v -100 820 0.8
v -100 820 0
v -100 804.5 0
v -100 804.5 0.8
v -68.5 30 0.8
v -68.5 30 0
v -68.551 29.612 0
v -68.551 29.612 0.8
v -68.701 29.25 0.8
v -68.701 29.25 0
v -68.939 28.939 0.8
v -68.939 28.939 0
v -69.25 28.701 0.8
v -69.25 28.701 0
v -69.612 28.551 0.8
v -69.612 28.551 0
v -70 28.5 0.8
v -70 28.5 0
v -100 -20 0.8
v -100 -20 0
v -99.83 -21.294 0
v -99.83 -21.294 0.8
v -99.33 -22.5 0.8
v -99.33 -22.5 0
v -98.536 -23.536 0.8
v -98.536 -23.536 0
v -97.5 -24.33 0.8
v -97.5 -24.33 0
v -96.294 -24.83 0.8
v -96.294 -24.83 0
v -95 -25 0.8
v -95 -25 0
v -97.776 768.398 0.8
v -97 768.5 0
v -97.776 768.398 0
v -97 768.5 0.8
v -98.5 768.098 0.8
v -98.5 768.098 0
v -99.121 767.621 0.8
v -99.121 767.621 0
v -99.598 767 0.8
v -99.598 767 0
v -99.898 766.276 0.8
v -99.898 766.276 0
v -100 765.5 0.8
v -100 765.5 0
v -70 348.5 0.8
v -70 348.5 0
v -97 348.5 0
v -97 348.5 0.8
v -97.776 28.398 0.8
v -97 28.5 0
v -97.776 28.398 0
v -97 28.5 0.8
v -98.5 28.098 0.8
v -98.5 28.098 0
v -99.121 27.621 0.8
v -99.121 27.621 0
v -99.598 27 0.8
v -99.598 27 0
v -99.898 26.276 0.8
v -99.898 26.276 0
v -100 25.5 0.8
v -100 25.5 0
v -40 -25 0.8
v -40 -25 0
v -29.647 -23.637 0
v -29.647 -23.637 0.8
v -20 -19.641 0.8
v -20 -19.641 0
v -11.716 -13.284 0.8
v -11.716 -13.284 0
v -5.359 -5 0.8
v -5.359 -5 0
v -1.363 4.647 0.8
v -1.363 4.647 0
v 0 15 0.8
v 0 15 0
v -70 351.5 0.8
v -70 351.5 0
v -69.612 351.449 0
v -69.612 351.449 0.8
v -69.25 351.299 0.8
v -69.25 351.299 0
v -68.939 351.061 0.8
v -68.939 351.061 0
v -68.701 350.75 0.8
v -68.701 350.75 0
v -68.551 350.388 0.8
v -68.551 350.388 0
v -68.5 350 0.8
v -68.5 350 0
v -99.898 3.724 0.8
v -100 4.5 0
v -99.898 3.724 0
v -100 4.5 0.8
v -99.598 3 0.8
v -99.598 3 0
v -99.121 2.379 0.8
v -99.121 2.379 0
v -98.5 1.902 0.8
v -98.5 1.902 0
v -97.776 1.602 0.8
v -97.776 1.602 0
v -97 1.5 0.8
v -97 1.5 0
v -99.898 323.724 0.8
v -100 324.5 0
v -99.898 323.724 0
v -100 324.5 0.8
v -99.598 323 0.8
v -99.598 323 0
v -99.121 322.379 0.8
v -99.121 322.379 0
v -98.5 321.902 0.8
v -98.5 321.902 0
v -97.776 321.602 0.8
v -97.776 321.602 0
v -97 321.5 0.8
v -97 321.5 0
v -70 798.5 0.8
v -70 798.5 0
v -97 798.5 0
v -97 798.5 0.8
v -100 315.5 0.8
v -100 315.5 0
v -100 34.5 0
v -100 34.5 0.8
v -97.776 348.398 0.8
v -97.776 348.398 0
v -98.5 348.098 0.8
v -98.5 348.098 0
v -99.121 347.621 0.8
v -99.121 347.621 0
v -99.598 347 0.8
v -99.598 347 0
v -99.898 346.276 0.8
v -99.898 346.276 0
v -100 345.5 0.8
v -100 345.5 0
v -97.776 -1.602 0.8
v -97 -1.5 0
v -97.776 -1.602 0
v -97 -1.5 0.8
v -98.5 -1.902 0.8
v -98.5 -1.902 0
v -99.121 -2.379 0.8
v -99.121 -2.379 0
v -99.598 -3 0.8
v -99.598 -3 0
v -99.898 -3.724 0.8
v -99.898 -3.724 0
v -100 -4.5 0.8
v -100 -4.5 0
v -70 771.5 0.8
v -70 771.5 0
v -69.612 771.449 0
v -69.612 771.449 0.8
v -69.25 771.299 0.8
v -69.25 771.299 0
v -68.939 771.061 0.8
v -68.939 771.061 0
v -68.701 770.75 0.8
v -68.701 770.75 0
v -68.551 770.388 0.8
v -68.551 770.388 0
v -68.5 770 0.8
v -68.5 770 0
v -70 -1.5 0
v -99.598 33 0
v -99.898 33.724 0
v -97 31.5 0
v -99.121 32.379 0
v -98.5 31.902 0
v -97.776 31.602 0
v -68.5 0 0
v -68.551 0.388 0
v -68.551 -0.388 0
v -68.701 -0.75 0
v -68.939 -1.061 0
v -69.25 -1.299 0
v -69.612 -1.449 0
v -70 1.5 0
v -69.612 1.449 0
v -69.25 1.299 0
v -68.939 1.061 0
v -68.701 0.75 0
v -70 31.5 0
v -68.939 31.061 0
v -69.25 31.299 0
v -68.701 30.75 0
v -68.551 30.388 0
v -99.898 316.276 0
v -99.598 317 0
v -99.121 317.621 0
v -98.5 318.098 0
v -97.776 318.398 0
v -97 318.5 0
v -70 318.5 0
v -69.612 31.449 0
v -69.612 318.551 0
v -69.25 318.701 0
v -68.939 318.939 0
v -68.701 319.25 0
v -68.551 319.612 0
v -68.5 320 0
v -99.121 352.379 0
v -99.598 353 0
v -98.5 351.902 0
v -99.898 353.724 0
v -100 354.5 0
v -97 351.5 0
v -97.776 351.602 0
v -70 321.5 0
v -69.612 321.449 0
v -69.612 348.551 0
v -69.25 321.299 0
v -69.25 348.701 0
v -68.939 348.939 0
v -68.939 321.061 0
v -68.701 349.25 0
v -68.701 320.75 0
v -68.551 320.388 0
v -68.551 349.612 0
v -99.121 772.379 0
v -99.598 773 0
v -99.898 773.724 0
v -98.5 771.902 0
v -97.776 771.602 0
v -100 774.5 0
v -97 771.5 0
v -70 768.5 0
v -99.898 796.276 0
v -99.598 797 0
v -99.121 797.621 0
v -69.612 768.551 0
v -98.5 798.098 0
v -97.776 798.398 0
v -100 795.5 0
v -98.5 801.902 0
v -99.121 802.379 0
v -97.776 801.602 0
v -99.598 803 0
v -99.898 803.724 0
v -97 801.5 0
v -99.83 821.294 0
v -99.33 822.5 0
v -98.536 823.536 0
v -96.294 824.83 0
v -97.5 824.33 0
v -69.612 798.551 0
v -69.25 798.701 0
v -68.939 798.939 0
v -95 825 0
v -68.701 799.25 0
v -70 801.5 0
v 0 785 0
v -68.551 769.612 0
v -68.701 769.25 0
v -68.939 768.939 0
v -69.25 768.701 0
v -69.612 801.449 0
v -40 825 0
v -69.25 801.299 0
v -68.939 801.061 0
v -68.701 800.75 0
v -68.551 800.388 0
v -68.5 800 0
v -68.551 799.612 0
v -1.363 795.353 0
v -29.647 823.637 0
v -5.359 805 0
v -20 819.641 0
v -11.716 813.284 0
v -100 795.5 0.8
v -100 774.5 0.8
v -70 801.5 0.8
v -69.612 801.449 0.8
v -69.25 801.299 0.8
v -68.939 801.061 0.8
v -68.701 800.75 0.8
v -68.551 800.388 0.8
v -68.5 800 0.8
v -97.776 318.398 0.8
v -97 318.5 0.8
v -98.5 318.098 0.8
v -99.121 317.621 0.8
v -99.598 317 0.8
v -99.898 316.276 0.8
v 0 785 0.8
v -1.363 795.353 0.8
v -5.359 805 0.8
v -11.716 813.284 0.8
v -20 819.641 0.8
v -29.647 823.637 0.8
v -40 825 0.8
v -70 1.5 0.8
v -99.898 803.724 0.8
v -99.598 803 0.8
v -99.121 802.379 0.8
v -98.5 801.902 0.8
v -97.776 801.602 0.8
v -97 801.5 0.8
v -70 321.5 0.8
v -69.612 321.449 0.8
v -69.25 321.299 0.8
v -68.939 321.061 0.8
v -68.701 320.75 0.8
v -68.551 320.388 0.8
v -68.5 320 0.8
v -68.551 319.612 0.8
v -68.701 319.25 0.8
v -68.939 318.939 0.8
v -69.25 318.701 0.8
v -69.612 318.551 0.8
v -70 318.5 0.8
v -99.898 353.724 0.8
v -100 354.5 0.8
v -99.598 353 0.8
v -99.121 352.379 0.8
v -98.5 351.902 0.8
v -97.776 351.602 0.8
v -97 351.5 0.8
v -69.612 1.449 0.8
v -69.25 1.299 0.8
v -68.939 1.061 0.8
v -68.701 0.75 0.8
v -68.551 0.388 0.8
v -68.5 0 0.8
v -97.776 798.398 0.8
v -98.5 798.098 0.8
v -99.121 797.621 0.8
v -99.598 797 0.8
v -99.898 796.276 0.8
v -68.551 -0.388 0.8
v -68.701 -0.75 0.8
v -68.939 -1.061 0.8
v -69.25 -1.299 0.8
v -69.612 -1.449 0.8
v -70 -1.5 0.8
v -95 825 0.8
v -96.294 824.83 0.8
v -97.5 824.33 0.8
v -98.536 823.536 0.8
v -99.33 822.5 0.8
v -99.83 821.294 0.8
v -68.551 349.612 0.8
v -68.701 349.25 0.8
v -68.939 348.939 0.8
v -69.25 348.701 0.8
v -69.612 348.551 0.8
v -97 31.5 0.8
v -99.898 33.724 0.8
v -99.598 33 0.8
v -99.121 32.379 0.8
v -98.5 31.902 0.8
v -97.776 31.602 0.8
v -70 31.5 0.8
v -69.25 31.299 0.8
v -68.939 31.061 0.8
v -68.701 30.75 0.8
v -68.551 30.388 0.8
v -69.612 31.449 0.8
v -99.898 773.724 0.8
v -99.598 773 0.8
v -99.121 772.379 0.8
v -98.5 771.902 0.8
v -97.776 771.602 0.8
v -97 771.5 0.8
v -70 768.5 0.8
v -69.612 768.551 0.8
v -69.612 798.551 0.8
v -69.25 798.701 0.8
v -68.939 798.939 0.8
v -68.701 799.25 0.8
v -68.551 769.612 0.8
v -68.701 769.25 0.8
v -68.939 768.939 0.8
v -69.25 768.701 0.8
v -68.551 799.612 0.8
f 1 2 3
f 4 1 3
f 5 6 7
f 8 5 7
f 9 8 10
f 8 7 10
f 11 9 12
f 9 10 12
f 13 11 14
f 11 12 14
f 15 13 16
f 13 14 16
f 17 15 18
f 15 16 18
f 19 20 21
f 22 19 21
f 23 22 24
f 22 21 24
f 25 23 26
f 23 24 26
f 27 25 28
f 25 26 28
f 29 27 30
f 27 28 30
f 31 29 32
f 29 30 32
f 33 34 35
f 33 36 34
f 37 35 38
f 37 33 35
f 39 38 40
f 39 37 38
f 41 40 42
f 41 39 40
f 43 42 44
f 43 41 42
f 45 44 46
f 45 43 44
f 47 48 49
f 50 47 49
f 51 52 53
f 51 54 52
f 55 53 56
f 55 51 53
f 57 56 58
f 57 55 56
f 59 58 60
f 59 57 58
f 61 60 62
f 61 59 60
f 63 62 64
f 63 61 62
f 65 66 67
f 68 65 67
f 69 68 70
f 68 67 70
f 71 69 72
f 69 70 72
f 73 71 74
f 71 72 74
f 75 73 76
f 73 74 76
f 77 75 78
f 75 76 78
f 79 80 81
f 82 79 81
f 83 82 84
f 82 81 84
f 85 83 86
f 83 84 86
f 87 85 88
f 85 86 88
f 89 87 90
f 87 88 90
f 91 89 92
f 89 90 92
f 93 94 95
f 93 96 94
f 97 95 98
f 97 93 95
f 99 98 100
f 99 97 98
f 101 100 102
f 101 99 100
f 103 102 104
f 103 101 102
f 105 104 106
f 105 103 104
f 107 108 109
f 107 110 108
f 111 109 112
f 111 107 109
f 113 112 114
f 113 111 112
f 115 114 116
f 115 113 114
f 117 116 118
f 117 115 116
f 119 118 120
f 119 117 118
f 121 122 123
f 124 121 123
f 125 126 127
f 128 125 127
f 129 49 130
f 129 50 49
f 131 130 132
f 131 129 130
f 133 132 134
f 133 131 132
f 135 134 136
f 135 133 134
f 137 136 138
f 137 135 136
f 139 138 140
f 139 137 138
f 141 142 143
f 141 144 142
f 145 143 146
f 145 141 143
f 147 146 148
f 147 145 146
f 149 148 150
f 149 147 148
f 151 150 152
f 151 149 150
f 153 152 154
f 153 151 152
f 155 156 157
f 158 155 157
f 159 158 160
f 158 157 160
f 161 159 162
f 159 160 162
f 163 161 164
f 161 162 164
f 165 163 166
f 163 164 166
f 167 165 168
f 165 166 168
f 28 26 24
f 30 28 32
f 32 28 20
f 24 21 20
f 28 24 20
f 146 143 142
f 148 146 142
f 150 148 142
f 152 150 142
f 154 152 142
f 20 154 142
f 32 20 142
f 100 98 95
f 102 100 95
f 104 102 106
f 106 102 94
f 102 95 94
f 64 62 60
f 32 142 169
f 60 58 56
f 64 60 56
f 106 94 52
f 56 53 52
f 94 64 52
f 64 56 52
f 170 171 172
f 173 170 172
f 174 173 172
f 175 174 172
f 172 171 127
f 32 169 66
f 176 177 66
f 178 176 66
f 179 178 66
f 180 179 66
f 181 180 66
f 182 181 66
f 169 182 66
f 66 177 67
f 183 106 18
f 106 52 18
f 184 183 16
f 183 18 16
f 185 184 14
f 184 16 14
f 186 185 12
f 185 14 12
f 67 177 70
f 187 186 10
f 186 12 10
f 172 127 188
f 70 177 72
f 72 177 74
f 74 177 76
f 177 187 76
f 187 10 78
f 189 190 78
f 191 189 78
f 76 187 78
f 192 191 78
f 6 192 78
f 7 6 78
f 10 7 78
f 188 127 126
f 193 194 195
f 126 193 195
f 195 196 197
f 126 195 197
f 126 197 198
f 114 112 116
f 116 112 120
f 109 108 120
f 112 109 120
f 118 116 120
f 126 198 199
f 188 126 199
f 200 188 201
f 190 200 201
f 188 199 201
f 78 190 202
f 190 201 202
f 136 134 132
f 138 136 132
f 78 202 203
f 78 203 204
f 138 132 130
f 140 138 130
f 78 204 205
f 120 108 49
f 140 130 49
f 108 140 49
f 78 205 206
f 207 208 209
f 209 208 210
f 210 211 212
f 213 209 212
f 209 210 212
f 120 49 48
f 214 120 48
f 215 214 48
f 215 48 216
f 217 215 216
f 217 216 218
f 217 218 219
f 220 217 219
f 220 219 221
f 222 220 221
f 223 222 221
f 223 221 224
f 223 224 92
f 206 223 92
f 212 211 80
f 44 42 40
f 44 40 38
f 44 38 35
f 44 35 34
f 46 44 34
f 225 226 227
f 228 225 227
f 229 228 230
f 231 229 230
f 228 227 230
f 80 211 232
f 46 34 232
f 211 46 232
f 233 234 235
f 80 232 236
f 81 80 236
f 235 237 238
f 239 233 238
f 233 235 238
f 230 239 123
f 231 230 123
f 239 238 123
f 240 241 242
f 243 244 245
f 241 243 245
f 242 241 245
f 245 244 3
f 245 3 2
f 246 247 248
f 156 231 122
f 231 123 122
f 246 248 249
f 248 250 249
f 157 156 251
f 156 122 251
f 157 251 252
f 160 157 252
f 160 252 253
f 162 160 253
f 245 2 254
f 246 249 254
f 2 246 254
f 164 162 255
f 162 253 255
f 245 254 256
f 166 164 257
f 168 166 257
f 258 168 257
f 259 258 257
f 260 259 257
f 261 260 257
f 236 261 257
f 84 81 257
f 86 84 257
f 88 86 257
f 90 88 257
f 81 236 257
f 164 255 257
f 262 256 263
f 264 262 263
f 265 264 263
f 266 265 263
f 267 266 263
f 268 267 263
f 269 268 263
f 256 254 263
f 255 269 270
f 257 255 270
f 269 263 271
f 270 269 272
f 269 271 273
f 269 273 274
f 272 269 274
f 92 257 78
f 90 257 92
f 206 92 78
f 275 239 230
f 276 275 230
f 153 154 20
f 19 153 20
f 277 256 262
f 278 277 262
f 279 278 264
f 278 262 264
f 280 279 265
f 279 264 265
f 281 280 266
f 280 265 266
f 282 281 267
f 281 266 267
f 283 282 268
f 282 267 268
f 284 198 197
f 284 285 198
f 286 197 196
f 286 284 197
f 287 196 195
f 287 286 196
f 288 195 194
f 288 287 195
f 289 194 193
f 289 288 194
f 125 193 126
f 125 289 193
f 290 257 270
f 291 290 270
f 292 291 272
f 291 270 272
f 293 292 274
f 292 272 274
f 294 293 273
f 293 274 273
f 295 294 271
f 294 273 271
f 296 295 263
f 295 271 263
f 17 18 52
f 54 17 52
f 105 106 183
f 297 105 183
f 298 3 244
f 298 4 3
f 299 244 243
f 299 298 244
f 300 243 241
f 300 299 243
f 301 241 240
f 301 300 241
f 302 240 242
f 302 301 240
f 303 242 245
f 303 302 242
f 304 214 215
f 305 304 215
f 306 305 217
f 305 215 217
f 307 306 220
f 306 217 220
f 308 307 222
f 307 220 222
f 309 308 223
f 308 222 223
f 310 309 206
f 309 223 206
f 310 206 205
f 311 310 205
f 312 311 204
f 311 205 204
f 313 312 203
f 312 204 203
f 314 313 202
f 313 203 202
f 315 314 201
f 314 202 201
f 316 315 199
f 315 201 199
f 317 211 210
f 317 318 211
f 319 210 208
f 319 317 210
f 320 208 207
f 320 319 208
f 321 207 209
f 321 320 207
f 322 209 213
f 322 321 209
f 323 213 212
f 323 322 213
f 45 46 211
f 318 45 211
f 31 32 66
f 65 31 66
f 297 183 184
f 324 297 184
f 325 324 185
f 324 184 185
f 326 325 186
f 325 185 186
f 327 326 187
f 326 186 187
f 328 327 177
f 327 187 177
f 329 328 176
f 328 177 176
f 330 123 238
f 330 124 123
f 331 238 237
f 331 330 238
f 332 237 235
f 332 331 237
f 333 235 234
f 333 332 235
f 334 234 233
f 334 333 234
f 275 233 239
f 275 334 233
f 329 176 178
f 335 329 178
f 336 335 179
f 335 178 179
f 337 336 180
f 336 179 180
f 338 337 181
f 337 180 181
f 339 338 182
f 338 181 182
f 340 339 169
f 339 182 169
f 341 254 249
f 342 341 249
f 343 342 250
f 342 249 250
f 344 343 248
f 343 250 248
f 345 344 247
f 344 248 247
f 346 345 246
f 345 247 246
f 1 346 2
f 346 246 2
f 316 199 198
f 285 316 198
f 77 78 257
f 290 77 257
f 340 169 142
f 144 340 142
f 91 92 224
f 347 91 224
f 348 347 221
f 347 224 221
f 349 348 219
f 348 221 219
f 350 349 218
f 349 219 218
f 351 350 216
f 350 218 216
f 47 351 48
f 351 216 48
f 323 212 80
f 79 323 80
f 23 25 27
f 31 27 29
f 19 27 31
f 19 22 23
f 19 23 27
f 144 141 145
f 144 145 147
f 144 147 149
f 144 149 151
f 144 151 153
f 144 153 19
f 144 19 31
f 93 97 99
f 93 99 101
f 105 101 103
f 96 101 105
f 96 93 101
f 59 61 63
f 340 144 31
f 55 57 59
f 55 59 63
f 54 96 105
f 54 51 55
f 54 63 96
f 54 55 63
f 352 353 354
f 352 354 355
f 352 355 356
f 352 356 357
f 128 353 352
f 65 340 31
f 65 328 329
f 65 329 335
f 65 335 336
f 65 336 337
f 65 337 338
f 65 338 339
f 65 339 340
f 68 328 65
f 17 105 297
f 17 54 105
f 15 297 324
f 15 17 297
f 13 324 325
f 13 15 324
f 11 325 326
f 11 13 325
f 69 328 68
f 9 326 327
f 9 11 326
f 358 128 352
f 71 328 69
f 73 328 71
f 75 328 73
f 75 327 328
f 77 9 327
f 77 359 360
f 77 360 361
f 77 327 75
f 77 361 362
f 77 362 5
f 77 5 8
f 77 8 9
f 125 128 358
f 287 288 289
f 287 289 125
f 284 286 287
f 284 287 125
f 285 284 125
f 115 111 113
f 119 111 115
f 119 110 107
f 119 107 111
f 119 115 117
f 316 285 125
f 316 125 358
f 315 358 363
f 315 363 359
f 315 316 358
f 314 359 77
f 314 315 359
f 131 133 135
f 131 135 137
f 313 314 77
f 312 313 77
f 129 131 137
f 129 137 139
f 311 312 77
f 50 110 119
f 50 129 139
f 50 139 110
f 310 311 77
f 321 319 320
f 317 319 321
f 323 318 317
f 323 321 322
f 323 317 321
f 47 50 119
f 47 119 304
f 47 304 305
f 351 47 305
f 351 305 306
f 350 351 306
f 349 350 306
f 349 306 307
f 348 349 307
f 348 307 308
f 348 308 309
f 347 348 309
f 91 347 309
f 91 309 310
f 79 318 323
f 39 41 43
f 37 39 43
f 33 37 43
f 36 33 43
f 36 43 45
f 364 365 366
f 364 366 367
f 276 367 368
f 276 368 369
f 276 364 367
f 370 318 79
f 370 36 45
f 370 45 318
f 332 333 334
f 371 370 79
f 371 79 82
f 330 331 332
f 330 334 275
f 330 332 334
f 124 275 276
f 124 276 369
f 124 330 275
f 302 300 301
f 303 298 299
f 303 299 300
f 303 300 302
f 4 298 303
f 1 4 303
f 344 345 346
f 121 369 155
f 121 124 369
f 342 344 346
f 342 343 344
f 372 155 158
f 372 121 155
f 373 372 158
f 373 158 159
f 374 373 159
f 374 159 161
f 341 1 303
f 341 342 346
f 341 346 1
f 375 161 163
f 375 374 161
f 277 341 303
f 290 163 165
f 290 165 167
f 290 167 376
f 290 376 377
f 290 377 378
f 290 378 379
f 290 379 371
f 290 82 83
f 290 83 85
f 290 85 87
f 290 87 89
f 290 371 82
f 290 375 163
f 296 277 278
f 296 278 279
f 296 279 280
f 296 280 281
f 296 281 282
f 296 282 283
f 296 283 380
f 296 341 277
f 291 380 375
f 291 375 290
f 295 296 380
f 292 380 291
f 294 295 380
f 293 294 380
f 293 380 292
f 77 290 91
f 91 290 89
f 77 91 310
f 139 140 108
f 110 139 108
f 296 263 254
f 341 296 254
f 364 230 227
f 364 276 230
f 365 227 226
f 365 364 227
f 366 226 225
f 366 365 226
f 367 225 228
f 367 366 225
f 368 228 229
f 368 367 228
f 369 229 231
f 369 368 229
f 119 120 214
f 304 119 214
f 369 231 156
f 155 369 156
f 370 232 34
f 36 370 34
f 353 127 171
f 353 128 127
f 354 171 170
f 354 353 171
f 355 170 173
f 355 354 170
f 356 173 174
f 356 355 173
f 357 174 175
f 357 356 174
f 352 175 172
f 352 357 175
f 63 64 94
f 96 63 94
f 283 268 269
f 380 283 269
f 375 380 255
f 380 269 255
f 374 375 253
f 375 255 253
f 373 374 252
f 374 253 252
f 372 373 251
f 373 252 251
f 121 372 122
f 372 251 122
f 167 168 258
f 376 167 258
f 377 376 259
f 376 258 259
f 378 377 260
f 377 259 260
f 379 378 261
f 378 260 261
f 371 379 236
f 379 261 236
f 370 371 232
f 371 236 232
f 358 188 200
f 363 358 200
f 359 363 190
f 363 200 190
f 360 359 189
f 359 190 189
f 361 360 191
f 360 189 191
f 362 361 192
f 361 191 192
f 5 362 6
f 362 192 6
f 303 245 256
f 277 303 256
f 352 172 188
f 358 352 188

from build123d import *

# Parameters (mm, degrees)
F1_DEPTH = 0.8
F2_R     = 3


with BuildPart() as f1:
    # F0 (on Top) → F1 (new body)
    with BuildSketch(Plane.XY):
        with BuildLine():
            Line((-40, 825), (-95, 825))
            ThreePointArc((-95, 825), (-98.535534, 823.535534), (-100, 820))
            Line((-100, 820), (-100, 801.5))
            Line((-100, 801.5), (-70, 801.5))
            ThreePointArc((-70, 801.5), (-68.93934, 801.06066), (-68.5, 800))
            ThreePointArc((-68.5, 800), (-68.93934, 798.93934), (-70, 798.5))
            Line((-70, 798.5), (-100, 798.5))
            Line((-100, 798.5), (-100, 771.5))
            Line((-100, 771.5), (-70, 771.5))
            ThreePointArc((-70, 771.5), (-68.93934, 771.06066), (-68.5, 770))
            ThreePointArc((-68.5, 770), (-68.93934, 768.93934), (-70, 768.5))
            Line((-70, 768.5), (-100, 768.5))
            Line((-100, 768.5), (-100, 351.5))
            Line((-100, 351.5), (-70, 351.5))
            ThreePointArc((-70, 351.5), (-68.93934, 351.06066), (-68.5, 350))
            ThreePointArc((-68.5, 350), (-68.93934, 348.93934), (-70, 348.5))
            Line((-70, 348.5), (-100, 348.5))
            Line((-100, 348.5), (-100, 321.5))
            Line((-100, 321.5), (-70, 321.5))
            ThreePointArc((-70, 321.5), (-68.93934, 321.06066), (-68.5, 320))
            ThreePointArc((-68.5, 320), (-68.93934, 318.93934), (-70, 318.5))
            Line((-70, 318.5), (-100, 318.5))
            Line((-100, 318.5), (-100, 31.5))
            Line((-100, 31.5), (-70, 31.5))
            ThreePointArc((-70, 31.5), (-68.93934, 31.06066), (-68.5, 30))
            ThreePointArc((-68.5, 30), (-68.93934, 28.93934), (-70, 28.5))
            Line((-70, 28.5), (-100, 28.5))
            Line((-100, 28.5), (-100, 1.5))
            Line((-100, 1.5), (-70, 1.5))
            ThreePointArc((-70, 1.5), (-68.93934, 1.06066), (-68.5, 0))
            ThreePointArc((-68.5, 0), (-68.93934, -1.06066), (-70, -1.5))
            Line((-70, -1.5), (-100, -1.5))
            Line((-100, -1.5), (-100, -20))
            ThreePointArc((-100, -20), (-98.535534, -23.535534), (-95, -25))
            Line((-95, -25), (-40, -25))
            ThreePointArc((-40, -25), (-11.715729, -13.284271), (0, 15))
            Line((0, 15), (0, 785))
            ThreePointArc((0, 785), (-11.715729, 813.284271), (-40, 825))
        make_face()
    extrude(amount=F1_DEPTH)

    # F2
    f2_edges = [f1.edges().sort_by_distance(p)[0] for p in [
        (-100, 801.5, 0.4),
        (-100, 798.5, 0.4),
        (-100, 771.5, 0.4),
        (-100, 768.5, 0.4),
        (-100, 351.5, 0.4),
        (-100, 348.5, 0.4),
        (-100, 321.5, 0.4),
        (-100, 318.5, 0.4),
        (-100, 31.5, 0.4),
        (-100, 28.5, 0.4),
        (-100, 1.5, 0.4),
        (-100, -1.5, 0.4),
    ]]
    fillet(f2_edges, radius=F2_R)


solid = f1.part
